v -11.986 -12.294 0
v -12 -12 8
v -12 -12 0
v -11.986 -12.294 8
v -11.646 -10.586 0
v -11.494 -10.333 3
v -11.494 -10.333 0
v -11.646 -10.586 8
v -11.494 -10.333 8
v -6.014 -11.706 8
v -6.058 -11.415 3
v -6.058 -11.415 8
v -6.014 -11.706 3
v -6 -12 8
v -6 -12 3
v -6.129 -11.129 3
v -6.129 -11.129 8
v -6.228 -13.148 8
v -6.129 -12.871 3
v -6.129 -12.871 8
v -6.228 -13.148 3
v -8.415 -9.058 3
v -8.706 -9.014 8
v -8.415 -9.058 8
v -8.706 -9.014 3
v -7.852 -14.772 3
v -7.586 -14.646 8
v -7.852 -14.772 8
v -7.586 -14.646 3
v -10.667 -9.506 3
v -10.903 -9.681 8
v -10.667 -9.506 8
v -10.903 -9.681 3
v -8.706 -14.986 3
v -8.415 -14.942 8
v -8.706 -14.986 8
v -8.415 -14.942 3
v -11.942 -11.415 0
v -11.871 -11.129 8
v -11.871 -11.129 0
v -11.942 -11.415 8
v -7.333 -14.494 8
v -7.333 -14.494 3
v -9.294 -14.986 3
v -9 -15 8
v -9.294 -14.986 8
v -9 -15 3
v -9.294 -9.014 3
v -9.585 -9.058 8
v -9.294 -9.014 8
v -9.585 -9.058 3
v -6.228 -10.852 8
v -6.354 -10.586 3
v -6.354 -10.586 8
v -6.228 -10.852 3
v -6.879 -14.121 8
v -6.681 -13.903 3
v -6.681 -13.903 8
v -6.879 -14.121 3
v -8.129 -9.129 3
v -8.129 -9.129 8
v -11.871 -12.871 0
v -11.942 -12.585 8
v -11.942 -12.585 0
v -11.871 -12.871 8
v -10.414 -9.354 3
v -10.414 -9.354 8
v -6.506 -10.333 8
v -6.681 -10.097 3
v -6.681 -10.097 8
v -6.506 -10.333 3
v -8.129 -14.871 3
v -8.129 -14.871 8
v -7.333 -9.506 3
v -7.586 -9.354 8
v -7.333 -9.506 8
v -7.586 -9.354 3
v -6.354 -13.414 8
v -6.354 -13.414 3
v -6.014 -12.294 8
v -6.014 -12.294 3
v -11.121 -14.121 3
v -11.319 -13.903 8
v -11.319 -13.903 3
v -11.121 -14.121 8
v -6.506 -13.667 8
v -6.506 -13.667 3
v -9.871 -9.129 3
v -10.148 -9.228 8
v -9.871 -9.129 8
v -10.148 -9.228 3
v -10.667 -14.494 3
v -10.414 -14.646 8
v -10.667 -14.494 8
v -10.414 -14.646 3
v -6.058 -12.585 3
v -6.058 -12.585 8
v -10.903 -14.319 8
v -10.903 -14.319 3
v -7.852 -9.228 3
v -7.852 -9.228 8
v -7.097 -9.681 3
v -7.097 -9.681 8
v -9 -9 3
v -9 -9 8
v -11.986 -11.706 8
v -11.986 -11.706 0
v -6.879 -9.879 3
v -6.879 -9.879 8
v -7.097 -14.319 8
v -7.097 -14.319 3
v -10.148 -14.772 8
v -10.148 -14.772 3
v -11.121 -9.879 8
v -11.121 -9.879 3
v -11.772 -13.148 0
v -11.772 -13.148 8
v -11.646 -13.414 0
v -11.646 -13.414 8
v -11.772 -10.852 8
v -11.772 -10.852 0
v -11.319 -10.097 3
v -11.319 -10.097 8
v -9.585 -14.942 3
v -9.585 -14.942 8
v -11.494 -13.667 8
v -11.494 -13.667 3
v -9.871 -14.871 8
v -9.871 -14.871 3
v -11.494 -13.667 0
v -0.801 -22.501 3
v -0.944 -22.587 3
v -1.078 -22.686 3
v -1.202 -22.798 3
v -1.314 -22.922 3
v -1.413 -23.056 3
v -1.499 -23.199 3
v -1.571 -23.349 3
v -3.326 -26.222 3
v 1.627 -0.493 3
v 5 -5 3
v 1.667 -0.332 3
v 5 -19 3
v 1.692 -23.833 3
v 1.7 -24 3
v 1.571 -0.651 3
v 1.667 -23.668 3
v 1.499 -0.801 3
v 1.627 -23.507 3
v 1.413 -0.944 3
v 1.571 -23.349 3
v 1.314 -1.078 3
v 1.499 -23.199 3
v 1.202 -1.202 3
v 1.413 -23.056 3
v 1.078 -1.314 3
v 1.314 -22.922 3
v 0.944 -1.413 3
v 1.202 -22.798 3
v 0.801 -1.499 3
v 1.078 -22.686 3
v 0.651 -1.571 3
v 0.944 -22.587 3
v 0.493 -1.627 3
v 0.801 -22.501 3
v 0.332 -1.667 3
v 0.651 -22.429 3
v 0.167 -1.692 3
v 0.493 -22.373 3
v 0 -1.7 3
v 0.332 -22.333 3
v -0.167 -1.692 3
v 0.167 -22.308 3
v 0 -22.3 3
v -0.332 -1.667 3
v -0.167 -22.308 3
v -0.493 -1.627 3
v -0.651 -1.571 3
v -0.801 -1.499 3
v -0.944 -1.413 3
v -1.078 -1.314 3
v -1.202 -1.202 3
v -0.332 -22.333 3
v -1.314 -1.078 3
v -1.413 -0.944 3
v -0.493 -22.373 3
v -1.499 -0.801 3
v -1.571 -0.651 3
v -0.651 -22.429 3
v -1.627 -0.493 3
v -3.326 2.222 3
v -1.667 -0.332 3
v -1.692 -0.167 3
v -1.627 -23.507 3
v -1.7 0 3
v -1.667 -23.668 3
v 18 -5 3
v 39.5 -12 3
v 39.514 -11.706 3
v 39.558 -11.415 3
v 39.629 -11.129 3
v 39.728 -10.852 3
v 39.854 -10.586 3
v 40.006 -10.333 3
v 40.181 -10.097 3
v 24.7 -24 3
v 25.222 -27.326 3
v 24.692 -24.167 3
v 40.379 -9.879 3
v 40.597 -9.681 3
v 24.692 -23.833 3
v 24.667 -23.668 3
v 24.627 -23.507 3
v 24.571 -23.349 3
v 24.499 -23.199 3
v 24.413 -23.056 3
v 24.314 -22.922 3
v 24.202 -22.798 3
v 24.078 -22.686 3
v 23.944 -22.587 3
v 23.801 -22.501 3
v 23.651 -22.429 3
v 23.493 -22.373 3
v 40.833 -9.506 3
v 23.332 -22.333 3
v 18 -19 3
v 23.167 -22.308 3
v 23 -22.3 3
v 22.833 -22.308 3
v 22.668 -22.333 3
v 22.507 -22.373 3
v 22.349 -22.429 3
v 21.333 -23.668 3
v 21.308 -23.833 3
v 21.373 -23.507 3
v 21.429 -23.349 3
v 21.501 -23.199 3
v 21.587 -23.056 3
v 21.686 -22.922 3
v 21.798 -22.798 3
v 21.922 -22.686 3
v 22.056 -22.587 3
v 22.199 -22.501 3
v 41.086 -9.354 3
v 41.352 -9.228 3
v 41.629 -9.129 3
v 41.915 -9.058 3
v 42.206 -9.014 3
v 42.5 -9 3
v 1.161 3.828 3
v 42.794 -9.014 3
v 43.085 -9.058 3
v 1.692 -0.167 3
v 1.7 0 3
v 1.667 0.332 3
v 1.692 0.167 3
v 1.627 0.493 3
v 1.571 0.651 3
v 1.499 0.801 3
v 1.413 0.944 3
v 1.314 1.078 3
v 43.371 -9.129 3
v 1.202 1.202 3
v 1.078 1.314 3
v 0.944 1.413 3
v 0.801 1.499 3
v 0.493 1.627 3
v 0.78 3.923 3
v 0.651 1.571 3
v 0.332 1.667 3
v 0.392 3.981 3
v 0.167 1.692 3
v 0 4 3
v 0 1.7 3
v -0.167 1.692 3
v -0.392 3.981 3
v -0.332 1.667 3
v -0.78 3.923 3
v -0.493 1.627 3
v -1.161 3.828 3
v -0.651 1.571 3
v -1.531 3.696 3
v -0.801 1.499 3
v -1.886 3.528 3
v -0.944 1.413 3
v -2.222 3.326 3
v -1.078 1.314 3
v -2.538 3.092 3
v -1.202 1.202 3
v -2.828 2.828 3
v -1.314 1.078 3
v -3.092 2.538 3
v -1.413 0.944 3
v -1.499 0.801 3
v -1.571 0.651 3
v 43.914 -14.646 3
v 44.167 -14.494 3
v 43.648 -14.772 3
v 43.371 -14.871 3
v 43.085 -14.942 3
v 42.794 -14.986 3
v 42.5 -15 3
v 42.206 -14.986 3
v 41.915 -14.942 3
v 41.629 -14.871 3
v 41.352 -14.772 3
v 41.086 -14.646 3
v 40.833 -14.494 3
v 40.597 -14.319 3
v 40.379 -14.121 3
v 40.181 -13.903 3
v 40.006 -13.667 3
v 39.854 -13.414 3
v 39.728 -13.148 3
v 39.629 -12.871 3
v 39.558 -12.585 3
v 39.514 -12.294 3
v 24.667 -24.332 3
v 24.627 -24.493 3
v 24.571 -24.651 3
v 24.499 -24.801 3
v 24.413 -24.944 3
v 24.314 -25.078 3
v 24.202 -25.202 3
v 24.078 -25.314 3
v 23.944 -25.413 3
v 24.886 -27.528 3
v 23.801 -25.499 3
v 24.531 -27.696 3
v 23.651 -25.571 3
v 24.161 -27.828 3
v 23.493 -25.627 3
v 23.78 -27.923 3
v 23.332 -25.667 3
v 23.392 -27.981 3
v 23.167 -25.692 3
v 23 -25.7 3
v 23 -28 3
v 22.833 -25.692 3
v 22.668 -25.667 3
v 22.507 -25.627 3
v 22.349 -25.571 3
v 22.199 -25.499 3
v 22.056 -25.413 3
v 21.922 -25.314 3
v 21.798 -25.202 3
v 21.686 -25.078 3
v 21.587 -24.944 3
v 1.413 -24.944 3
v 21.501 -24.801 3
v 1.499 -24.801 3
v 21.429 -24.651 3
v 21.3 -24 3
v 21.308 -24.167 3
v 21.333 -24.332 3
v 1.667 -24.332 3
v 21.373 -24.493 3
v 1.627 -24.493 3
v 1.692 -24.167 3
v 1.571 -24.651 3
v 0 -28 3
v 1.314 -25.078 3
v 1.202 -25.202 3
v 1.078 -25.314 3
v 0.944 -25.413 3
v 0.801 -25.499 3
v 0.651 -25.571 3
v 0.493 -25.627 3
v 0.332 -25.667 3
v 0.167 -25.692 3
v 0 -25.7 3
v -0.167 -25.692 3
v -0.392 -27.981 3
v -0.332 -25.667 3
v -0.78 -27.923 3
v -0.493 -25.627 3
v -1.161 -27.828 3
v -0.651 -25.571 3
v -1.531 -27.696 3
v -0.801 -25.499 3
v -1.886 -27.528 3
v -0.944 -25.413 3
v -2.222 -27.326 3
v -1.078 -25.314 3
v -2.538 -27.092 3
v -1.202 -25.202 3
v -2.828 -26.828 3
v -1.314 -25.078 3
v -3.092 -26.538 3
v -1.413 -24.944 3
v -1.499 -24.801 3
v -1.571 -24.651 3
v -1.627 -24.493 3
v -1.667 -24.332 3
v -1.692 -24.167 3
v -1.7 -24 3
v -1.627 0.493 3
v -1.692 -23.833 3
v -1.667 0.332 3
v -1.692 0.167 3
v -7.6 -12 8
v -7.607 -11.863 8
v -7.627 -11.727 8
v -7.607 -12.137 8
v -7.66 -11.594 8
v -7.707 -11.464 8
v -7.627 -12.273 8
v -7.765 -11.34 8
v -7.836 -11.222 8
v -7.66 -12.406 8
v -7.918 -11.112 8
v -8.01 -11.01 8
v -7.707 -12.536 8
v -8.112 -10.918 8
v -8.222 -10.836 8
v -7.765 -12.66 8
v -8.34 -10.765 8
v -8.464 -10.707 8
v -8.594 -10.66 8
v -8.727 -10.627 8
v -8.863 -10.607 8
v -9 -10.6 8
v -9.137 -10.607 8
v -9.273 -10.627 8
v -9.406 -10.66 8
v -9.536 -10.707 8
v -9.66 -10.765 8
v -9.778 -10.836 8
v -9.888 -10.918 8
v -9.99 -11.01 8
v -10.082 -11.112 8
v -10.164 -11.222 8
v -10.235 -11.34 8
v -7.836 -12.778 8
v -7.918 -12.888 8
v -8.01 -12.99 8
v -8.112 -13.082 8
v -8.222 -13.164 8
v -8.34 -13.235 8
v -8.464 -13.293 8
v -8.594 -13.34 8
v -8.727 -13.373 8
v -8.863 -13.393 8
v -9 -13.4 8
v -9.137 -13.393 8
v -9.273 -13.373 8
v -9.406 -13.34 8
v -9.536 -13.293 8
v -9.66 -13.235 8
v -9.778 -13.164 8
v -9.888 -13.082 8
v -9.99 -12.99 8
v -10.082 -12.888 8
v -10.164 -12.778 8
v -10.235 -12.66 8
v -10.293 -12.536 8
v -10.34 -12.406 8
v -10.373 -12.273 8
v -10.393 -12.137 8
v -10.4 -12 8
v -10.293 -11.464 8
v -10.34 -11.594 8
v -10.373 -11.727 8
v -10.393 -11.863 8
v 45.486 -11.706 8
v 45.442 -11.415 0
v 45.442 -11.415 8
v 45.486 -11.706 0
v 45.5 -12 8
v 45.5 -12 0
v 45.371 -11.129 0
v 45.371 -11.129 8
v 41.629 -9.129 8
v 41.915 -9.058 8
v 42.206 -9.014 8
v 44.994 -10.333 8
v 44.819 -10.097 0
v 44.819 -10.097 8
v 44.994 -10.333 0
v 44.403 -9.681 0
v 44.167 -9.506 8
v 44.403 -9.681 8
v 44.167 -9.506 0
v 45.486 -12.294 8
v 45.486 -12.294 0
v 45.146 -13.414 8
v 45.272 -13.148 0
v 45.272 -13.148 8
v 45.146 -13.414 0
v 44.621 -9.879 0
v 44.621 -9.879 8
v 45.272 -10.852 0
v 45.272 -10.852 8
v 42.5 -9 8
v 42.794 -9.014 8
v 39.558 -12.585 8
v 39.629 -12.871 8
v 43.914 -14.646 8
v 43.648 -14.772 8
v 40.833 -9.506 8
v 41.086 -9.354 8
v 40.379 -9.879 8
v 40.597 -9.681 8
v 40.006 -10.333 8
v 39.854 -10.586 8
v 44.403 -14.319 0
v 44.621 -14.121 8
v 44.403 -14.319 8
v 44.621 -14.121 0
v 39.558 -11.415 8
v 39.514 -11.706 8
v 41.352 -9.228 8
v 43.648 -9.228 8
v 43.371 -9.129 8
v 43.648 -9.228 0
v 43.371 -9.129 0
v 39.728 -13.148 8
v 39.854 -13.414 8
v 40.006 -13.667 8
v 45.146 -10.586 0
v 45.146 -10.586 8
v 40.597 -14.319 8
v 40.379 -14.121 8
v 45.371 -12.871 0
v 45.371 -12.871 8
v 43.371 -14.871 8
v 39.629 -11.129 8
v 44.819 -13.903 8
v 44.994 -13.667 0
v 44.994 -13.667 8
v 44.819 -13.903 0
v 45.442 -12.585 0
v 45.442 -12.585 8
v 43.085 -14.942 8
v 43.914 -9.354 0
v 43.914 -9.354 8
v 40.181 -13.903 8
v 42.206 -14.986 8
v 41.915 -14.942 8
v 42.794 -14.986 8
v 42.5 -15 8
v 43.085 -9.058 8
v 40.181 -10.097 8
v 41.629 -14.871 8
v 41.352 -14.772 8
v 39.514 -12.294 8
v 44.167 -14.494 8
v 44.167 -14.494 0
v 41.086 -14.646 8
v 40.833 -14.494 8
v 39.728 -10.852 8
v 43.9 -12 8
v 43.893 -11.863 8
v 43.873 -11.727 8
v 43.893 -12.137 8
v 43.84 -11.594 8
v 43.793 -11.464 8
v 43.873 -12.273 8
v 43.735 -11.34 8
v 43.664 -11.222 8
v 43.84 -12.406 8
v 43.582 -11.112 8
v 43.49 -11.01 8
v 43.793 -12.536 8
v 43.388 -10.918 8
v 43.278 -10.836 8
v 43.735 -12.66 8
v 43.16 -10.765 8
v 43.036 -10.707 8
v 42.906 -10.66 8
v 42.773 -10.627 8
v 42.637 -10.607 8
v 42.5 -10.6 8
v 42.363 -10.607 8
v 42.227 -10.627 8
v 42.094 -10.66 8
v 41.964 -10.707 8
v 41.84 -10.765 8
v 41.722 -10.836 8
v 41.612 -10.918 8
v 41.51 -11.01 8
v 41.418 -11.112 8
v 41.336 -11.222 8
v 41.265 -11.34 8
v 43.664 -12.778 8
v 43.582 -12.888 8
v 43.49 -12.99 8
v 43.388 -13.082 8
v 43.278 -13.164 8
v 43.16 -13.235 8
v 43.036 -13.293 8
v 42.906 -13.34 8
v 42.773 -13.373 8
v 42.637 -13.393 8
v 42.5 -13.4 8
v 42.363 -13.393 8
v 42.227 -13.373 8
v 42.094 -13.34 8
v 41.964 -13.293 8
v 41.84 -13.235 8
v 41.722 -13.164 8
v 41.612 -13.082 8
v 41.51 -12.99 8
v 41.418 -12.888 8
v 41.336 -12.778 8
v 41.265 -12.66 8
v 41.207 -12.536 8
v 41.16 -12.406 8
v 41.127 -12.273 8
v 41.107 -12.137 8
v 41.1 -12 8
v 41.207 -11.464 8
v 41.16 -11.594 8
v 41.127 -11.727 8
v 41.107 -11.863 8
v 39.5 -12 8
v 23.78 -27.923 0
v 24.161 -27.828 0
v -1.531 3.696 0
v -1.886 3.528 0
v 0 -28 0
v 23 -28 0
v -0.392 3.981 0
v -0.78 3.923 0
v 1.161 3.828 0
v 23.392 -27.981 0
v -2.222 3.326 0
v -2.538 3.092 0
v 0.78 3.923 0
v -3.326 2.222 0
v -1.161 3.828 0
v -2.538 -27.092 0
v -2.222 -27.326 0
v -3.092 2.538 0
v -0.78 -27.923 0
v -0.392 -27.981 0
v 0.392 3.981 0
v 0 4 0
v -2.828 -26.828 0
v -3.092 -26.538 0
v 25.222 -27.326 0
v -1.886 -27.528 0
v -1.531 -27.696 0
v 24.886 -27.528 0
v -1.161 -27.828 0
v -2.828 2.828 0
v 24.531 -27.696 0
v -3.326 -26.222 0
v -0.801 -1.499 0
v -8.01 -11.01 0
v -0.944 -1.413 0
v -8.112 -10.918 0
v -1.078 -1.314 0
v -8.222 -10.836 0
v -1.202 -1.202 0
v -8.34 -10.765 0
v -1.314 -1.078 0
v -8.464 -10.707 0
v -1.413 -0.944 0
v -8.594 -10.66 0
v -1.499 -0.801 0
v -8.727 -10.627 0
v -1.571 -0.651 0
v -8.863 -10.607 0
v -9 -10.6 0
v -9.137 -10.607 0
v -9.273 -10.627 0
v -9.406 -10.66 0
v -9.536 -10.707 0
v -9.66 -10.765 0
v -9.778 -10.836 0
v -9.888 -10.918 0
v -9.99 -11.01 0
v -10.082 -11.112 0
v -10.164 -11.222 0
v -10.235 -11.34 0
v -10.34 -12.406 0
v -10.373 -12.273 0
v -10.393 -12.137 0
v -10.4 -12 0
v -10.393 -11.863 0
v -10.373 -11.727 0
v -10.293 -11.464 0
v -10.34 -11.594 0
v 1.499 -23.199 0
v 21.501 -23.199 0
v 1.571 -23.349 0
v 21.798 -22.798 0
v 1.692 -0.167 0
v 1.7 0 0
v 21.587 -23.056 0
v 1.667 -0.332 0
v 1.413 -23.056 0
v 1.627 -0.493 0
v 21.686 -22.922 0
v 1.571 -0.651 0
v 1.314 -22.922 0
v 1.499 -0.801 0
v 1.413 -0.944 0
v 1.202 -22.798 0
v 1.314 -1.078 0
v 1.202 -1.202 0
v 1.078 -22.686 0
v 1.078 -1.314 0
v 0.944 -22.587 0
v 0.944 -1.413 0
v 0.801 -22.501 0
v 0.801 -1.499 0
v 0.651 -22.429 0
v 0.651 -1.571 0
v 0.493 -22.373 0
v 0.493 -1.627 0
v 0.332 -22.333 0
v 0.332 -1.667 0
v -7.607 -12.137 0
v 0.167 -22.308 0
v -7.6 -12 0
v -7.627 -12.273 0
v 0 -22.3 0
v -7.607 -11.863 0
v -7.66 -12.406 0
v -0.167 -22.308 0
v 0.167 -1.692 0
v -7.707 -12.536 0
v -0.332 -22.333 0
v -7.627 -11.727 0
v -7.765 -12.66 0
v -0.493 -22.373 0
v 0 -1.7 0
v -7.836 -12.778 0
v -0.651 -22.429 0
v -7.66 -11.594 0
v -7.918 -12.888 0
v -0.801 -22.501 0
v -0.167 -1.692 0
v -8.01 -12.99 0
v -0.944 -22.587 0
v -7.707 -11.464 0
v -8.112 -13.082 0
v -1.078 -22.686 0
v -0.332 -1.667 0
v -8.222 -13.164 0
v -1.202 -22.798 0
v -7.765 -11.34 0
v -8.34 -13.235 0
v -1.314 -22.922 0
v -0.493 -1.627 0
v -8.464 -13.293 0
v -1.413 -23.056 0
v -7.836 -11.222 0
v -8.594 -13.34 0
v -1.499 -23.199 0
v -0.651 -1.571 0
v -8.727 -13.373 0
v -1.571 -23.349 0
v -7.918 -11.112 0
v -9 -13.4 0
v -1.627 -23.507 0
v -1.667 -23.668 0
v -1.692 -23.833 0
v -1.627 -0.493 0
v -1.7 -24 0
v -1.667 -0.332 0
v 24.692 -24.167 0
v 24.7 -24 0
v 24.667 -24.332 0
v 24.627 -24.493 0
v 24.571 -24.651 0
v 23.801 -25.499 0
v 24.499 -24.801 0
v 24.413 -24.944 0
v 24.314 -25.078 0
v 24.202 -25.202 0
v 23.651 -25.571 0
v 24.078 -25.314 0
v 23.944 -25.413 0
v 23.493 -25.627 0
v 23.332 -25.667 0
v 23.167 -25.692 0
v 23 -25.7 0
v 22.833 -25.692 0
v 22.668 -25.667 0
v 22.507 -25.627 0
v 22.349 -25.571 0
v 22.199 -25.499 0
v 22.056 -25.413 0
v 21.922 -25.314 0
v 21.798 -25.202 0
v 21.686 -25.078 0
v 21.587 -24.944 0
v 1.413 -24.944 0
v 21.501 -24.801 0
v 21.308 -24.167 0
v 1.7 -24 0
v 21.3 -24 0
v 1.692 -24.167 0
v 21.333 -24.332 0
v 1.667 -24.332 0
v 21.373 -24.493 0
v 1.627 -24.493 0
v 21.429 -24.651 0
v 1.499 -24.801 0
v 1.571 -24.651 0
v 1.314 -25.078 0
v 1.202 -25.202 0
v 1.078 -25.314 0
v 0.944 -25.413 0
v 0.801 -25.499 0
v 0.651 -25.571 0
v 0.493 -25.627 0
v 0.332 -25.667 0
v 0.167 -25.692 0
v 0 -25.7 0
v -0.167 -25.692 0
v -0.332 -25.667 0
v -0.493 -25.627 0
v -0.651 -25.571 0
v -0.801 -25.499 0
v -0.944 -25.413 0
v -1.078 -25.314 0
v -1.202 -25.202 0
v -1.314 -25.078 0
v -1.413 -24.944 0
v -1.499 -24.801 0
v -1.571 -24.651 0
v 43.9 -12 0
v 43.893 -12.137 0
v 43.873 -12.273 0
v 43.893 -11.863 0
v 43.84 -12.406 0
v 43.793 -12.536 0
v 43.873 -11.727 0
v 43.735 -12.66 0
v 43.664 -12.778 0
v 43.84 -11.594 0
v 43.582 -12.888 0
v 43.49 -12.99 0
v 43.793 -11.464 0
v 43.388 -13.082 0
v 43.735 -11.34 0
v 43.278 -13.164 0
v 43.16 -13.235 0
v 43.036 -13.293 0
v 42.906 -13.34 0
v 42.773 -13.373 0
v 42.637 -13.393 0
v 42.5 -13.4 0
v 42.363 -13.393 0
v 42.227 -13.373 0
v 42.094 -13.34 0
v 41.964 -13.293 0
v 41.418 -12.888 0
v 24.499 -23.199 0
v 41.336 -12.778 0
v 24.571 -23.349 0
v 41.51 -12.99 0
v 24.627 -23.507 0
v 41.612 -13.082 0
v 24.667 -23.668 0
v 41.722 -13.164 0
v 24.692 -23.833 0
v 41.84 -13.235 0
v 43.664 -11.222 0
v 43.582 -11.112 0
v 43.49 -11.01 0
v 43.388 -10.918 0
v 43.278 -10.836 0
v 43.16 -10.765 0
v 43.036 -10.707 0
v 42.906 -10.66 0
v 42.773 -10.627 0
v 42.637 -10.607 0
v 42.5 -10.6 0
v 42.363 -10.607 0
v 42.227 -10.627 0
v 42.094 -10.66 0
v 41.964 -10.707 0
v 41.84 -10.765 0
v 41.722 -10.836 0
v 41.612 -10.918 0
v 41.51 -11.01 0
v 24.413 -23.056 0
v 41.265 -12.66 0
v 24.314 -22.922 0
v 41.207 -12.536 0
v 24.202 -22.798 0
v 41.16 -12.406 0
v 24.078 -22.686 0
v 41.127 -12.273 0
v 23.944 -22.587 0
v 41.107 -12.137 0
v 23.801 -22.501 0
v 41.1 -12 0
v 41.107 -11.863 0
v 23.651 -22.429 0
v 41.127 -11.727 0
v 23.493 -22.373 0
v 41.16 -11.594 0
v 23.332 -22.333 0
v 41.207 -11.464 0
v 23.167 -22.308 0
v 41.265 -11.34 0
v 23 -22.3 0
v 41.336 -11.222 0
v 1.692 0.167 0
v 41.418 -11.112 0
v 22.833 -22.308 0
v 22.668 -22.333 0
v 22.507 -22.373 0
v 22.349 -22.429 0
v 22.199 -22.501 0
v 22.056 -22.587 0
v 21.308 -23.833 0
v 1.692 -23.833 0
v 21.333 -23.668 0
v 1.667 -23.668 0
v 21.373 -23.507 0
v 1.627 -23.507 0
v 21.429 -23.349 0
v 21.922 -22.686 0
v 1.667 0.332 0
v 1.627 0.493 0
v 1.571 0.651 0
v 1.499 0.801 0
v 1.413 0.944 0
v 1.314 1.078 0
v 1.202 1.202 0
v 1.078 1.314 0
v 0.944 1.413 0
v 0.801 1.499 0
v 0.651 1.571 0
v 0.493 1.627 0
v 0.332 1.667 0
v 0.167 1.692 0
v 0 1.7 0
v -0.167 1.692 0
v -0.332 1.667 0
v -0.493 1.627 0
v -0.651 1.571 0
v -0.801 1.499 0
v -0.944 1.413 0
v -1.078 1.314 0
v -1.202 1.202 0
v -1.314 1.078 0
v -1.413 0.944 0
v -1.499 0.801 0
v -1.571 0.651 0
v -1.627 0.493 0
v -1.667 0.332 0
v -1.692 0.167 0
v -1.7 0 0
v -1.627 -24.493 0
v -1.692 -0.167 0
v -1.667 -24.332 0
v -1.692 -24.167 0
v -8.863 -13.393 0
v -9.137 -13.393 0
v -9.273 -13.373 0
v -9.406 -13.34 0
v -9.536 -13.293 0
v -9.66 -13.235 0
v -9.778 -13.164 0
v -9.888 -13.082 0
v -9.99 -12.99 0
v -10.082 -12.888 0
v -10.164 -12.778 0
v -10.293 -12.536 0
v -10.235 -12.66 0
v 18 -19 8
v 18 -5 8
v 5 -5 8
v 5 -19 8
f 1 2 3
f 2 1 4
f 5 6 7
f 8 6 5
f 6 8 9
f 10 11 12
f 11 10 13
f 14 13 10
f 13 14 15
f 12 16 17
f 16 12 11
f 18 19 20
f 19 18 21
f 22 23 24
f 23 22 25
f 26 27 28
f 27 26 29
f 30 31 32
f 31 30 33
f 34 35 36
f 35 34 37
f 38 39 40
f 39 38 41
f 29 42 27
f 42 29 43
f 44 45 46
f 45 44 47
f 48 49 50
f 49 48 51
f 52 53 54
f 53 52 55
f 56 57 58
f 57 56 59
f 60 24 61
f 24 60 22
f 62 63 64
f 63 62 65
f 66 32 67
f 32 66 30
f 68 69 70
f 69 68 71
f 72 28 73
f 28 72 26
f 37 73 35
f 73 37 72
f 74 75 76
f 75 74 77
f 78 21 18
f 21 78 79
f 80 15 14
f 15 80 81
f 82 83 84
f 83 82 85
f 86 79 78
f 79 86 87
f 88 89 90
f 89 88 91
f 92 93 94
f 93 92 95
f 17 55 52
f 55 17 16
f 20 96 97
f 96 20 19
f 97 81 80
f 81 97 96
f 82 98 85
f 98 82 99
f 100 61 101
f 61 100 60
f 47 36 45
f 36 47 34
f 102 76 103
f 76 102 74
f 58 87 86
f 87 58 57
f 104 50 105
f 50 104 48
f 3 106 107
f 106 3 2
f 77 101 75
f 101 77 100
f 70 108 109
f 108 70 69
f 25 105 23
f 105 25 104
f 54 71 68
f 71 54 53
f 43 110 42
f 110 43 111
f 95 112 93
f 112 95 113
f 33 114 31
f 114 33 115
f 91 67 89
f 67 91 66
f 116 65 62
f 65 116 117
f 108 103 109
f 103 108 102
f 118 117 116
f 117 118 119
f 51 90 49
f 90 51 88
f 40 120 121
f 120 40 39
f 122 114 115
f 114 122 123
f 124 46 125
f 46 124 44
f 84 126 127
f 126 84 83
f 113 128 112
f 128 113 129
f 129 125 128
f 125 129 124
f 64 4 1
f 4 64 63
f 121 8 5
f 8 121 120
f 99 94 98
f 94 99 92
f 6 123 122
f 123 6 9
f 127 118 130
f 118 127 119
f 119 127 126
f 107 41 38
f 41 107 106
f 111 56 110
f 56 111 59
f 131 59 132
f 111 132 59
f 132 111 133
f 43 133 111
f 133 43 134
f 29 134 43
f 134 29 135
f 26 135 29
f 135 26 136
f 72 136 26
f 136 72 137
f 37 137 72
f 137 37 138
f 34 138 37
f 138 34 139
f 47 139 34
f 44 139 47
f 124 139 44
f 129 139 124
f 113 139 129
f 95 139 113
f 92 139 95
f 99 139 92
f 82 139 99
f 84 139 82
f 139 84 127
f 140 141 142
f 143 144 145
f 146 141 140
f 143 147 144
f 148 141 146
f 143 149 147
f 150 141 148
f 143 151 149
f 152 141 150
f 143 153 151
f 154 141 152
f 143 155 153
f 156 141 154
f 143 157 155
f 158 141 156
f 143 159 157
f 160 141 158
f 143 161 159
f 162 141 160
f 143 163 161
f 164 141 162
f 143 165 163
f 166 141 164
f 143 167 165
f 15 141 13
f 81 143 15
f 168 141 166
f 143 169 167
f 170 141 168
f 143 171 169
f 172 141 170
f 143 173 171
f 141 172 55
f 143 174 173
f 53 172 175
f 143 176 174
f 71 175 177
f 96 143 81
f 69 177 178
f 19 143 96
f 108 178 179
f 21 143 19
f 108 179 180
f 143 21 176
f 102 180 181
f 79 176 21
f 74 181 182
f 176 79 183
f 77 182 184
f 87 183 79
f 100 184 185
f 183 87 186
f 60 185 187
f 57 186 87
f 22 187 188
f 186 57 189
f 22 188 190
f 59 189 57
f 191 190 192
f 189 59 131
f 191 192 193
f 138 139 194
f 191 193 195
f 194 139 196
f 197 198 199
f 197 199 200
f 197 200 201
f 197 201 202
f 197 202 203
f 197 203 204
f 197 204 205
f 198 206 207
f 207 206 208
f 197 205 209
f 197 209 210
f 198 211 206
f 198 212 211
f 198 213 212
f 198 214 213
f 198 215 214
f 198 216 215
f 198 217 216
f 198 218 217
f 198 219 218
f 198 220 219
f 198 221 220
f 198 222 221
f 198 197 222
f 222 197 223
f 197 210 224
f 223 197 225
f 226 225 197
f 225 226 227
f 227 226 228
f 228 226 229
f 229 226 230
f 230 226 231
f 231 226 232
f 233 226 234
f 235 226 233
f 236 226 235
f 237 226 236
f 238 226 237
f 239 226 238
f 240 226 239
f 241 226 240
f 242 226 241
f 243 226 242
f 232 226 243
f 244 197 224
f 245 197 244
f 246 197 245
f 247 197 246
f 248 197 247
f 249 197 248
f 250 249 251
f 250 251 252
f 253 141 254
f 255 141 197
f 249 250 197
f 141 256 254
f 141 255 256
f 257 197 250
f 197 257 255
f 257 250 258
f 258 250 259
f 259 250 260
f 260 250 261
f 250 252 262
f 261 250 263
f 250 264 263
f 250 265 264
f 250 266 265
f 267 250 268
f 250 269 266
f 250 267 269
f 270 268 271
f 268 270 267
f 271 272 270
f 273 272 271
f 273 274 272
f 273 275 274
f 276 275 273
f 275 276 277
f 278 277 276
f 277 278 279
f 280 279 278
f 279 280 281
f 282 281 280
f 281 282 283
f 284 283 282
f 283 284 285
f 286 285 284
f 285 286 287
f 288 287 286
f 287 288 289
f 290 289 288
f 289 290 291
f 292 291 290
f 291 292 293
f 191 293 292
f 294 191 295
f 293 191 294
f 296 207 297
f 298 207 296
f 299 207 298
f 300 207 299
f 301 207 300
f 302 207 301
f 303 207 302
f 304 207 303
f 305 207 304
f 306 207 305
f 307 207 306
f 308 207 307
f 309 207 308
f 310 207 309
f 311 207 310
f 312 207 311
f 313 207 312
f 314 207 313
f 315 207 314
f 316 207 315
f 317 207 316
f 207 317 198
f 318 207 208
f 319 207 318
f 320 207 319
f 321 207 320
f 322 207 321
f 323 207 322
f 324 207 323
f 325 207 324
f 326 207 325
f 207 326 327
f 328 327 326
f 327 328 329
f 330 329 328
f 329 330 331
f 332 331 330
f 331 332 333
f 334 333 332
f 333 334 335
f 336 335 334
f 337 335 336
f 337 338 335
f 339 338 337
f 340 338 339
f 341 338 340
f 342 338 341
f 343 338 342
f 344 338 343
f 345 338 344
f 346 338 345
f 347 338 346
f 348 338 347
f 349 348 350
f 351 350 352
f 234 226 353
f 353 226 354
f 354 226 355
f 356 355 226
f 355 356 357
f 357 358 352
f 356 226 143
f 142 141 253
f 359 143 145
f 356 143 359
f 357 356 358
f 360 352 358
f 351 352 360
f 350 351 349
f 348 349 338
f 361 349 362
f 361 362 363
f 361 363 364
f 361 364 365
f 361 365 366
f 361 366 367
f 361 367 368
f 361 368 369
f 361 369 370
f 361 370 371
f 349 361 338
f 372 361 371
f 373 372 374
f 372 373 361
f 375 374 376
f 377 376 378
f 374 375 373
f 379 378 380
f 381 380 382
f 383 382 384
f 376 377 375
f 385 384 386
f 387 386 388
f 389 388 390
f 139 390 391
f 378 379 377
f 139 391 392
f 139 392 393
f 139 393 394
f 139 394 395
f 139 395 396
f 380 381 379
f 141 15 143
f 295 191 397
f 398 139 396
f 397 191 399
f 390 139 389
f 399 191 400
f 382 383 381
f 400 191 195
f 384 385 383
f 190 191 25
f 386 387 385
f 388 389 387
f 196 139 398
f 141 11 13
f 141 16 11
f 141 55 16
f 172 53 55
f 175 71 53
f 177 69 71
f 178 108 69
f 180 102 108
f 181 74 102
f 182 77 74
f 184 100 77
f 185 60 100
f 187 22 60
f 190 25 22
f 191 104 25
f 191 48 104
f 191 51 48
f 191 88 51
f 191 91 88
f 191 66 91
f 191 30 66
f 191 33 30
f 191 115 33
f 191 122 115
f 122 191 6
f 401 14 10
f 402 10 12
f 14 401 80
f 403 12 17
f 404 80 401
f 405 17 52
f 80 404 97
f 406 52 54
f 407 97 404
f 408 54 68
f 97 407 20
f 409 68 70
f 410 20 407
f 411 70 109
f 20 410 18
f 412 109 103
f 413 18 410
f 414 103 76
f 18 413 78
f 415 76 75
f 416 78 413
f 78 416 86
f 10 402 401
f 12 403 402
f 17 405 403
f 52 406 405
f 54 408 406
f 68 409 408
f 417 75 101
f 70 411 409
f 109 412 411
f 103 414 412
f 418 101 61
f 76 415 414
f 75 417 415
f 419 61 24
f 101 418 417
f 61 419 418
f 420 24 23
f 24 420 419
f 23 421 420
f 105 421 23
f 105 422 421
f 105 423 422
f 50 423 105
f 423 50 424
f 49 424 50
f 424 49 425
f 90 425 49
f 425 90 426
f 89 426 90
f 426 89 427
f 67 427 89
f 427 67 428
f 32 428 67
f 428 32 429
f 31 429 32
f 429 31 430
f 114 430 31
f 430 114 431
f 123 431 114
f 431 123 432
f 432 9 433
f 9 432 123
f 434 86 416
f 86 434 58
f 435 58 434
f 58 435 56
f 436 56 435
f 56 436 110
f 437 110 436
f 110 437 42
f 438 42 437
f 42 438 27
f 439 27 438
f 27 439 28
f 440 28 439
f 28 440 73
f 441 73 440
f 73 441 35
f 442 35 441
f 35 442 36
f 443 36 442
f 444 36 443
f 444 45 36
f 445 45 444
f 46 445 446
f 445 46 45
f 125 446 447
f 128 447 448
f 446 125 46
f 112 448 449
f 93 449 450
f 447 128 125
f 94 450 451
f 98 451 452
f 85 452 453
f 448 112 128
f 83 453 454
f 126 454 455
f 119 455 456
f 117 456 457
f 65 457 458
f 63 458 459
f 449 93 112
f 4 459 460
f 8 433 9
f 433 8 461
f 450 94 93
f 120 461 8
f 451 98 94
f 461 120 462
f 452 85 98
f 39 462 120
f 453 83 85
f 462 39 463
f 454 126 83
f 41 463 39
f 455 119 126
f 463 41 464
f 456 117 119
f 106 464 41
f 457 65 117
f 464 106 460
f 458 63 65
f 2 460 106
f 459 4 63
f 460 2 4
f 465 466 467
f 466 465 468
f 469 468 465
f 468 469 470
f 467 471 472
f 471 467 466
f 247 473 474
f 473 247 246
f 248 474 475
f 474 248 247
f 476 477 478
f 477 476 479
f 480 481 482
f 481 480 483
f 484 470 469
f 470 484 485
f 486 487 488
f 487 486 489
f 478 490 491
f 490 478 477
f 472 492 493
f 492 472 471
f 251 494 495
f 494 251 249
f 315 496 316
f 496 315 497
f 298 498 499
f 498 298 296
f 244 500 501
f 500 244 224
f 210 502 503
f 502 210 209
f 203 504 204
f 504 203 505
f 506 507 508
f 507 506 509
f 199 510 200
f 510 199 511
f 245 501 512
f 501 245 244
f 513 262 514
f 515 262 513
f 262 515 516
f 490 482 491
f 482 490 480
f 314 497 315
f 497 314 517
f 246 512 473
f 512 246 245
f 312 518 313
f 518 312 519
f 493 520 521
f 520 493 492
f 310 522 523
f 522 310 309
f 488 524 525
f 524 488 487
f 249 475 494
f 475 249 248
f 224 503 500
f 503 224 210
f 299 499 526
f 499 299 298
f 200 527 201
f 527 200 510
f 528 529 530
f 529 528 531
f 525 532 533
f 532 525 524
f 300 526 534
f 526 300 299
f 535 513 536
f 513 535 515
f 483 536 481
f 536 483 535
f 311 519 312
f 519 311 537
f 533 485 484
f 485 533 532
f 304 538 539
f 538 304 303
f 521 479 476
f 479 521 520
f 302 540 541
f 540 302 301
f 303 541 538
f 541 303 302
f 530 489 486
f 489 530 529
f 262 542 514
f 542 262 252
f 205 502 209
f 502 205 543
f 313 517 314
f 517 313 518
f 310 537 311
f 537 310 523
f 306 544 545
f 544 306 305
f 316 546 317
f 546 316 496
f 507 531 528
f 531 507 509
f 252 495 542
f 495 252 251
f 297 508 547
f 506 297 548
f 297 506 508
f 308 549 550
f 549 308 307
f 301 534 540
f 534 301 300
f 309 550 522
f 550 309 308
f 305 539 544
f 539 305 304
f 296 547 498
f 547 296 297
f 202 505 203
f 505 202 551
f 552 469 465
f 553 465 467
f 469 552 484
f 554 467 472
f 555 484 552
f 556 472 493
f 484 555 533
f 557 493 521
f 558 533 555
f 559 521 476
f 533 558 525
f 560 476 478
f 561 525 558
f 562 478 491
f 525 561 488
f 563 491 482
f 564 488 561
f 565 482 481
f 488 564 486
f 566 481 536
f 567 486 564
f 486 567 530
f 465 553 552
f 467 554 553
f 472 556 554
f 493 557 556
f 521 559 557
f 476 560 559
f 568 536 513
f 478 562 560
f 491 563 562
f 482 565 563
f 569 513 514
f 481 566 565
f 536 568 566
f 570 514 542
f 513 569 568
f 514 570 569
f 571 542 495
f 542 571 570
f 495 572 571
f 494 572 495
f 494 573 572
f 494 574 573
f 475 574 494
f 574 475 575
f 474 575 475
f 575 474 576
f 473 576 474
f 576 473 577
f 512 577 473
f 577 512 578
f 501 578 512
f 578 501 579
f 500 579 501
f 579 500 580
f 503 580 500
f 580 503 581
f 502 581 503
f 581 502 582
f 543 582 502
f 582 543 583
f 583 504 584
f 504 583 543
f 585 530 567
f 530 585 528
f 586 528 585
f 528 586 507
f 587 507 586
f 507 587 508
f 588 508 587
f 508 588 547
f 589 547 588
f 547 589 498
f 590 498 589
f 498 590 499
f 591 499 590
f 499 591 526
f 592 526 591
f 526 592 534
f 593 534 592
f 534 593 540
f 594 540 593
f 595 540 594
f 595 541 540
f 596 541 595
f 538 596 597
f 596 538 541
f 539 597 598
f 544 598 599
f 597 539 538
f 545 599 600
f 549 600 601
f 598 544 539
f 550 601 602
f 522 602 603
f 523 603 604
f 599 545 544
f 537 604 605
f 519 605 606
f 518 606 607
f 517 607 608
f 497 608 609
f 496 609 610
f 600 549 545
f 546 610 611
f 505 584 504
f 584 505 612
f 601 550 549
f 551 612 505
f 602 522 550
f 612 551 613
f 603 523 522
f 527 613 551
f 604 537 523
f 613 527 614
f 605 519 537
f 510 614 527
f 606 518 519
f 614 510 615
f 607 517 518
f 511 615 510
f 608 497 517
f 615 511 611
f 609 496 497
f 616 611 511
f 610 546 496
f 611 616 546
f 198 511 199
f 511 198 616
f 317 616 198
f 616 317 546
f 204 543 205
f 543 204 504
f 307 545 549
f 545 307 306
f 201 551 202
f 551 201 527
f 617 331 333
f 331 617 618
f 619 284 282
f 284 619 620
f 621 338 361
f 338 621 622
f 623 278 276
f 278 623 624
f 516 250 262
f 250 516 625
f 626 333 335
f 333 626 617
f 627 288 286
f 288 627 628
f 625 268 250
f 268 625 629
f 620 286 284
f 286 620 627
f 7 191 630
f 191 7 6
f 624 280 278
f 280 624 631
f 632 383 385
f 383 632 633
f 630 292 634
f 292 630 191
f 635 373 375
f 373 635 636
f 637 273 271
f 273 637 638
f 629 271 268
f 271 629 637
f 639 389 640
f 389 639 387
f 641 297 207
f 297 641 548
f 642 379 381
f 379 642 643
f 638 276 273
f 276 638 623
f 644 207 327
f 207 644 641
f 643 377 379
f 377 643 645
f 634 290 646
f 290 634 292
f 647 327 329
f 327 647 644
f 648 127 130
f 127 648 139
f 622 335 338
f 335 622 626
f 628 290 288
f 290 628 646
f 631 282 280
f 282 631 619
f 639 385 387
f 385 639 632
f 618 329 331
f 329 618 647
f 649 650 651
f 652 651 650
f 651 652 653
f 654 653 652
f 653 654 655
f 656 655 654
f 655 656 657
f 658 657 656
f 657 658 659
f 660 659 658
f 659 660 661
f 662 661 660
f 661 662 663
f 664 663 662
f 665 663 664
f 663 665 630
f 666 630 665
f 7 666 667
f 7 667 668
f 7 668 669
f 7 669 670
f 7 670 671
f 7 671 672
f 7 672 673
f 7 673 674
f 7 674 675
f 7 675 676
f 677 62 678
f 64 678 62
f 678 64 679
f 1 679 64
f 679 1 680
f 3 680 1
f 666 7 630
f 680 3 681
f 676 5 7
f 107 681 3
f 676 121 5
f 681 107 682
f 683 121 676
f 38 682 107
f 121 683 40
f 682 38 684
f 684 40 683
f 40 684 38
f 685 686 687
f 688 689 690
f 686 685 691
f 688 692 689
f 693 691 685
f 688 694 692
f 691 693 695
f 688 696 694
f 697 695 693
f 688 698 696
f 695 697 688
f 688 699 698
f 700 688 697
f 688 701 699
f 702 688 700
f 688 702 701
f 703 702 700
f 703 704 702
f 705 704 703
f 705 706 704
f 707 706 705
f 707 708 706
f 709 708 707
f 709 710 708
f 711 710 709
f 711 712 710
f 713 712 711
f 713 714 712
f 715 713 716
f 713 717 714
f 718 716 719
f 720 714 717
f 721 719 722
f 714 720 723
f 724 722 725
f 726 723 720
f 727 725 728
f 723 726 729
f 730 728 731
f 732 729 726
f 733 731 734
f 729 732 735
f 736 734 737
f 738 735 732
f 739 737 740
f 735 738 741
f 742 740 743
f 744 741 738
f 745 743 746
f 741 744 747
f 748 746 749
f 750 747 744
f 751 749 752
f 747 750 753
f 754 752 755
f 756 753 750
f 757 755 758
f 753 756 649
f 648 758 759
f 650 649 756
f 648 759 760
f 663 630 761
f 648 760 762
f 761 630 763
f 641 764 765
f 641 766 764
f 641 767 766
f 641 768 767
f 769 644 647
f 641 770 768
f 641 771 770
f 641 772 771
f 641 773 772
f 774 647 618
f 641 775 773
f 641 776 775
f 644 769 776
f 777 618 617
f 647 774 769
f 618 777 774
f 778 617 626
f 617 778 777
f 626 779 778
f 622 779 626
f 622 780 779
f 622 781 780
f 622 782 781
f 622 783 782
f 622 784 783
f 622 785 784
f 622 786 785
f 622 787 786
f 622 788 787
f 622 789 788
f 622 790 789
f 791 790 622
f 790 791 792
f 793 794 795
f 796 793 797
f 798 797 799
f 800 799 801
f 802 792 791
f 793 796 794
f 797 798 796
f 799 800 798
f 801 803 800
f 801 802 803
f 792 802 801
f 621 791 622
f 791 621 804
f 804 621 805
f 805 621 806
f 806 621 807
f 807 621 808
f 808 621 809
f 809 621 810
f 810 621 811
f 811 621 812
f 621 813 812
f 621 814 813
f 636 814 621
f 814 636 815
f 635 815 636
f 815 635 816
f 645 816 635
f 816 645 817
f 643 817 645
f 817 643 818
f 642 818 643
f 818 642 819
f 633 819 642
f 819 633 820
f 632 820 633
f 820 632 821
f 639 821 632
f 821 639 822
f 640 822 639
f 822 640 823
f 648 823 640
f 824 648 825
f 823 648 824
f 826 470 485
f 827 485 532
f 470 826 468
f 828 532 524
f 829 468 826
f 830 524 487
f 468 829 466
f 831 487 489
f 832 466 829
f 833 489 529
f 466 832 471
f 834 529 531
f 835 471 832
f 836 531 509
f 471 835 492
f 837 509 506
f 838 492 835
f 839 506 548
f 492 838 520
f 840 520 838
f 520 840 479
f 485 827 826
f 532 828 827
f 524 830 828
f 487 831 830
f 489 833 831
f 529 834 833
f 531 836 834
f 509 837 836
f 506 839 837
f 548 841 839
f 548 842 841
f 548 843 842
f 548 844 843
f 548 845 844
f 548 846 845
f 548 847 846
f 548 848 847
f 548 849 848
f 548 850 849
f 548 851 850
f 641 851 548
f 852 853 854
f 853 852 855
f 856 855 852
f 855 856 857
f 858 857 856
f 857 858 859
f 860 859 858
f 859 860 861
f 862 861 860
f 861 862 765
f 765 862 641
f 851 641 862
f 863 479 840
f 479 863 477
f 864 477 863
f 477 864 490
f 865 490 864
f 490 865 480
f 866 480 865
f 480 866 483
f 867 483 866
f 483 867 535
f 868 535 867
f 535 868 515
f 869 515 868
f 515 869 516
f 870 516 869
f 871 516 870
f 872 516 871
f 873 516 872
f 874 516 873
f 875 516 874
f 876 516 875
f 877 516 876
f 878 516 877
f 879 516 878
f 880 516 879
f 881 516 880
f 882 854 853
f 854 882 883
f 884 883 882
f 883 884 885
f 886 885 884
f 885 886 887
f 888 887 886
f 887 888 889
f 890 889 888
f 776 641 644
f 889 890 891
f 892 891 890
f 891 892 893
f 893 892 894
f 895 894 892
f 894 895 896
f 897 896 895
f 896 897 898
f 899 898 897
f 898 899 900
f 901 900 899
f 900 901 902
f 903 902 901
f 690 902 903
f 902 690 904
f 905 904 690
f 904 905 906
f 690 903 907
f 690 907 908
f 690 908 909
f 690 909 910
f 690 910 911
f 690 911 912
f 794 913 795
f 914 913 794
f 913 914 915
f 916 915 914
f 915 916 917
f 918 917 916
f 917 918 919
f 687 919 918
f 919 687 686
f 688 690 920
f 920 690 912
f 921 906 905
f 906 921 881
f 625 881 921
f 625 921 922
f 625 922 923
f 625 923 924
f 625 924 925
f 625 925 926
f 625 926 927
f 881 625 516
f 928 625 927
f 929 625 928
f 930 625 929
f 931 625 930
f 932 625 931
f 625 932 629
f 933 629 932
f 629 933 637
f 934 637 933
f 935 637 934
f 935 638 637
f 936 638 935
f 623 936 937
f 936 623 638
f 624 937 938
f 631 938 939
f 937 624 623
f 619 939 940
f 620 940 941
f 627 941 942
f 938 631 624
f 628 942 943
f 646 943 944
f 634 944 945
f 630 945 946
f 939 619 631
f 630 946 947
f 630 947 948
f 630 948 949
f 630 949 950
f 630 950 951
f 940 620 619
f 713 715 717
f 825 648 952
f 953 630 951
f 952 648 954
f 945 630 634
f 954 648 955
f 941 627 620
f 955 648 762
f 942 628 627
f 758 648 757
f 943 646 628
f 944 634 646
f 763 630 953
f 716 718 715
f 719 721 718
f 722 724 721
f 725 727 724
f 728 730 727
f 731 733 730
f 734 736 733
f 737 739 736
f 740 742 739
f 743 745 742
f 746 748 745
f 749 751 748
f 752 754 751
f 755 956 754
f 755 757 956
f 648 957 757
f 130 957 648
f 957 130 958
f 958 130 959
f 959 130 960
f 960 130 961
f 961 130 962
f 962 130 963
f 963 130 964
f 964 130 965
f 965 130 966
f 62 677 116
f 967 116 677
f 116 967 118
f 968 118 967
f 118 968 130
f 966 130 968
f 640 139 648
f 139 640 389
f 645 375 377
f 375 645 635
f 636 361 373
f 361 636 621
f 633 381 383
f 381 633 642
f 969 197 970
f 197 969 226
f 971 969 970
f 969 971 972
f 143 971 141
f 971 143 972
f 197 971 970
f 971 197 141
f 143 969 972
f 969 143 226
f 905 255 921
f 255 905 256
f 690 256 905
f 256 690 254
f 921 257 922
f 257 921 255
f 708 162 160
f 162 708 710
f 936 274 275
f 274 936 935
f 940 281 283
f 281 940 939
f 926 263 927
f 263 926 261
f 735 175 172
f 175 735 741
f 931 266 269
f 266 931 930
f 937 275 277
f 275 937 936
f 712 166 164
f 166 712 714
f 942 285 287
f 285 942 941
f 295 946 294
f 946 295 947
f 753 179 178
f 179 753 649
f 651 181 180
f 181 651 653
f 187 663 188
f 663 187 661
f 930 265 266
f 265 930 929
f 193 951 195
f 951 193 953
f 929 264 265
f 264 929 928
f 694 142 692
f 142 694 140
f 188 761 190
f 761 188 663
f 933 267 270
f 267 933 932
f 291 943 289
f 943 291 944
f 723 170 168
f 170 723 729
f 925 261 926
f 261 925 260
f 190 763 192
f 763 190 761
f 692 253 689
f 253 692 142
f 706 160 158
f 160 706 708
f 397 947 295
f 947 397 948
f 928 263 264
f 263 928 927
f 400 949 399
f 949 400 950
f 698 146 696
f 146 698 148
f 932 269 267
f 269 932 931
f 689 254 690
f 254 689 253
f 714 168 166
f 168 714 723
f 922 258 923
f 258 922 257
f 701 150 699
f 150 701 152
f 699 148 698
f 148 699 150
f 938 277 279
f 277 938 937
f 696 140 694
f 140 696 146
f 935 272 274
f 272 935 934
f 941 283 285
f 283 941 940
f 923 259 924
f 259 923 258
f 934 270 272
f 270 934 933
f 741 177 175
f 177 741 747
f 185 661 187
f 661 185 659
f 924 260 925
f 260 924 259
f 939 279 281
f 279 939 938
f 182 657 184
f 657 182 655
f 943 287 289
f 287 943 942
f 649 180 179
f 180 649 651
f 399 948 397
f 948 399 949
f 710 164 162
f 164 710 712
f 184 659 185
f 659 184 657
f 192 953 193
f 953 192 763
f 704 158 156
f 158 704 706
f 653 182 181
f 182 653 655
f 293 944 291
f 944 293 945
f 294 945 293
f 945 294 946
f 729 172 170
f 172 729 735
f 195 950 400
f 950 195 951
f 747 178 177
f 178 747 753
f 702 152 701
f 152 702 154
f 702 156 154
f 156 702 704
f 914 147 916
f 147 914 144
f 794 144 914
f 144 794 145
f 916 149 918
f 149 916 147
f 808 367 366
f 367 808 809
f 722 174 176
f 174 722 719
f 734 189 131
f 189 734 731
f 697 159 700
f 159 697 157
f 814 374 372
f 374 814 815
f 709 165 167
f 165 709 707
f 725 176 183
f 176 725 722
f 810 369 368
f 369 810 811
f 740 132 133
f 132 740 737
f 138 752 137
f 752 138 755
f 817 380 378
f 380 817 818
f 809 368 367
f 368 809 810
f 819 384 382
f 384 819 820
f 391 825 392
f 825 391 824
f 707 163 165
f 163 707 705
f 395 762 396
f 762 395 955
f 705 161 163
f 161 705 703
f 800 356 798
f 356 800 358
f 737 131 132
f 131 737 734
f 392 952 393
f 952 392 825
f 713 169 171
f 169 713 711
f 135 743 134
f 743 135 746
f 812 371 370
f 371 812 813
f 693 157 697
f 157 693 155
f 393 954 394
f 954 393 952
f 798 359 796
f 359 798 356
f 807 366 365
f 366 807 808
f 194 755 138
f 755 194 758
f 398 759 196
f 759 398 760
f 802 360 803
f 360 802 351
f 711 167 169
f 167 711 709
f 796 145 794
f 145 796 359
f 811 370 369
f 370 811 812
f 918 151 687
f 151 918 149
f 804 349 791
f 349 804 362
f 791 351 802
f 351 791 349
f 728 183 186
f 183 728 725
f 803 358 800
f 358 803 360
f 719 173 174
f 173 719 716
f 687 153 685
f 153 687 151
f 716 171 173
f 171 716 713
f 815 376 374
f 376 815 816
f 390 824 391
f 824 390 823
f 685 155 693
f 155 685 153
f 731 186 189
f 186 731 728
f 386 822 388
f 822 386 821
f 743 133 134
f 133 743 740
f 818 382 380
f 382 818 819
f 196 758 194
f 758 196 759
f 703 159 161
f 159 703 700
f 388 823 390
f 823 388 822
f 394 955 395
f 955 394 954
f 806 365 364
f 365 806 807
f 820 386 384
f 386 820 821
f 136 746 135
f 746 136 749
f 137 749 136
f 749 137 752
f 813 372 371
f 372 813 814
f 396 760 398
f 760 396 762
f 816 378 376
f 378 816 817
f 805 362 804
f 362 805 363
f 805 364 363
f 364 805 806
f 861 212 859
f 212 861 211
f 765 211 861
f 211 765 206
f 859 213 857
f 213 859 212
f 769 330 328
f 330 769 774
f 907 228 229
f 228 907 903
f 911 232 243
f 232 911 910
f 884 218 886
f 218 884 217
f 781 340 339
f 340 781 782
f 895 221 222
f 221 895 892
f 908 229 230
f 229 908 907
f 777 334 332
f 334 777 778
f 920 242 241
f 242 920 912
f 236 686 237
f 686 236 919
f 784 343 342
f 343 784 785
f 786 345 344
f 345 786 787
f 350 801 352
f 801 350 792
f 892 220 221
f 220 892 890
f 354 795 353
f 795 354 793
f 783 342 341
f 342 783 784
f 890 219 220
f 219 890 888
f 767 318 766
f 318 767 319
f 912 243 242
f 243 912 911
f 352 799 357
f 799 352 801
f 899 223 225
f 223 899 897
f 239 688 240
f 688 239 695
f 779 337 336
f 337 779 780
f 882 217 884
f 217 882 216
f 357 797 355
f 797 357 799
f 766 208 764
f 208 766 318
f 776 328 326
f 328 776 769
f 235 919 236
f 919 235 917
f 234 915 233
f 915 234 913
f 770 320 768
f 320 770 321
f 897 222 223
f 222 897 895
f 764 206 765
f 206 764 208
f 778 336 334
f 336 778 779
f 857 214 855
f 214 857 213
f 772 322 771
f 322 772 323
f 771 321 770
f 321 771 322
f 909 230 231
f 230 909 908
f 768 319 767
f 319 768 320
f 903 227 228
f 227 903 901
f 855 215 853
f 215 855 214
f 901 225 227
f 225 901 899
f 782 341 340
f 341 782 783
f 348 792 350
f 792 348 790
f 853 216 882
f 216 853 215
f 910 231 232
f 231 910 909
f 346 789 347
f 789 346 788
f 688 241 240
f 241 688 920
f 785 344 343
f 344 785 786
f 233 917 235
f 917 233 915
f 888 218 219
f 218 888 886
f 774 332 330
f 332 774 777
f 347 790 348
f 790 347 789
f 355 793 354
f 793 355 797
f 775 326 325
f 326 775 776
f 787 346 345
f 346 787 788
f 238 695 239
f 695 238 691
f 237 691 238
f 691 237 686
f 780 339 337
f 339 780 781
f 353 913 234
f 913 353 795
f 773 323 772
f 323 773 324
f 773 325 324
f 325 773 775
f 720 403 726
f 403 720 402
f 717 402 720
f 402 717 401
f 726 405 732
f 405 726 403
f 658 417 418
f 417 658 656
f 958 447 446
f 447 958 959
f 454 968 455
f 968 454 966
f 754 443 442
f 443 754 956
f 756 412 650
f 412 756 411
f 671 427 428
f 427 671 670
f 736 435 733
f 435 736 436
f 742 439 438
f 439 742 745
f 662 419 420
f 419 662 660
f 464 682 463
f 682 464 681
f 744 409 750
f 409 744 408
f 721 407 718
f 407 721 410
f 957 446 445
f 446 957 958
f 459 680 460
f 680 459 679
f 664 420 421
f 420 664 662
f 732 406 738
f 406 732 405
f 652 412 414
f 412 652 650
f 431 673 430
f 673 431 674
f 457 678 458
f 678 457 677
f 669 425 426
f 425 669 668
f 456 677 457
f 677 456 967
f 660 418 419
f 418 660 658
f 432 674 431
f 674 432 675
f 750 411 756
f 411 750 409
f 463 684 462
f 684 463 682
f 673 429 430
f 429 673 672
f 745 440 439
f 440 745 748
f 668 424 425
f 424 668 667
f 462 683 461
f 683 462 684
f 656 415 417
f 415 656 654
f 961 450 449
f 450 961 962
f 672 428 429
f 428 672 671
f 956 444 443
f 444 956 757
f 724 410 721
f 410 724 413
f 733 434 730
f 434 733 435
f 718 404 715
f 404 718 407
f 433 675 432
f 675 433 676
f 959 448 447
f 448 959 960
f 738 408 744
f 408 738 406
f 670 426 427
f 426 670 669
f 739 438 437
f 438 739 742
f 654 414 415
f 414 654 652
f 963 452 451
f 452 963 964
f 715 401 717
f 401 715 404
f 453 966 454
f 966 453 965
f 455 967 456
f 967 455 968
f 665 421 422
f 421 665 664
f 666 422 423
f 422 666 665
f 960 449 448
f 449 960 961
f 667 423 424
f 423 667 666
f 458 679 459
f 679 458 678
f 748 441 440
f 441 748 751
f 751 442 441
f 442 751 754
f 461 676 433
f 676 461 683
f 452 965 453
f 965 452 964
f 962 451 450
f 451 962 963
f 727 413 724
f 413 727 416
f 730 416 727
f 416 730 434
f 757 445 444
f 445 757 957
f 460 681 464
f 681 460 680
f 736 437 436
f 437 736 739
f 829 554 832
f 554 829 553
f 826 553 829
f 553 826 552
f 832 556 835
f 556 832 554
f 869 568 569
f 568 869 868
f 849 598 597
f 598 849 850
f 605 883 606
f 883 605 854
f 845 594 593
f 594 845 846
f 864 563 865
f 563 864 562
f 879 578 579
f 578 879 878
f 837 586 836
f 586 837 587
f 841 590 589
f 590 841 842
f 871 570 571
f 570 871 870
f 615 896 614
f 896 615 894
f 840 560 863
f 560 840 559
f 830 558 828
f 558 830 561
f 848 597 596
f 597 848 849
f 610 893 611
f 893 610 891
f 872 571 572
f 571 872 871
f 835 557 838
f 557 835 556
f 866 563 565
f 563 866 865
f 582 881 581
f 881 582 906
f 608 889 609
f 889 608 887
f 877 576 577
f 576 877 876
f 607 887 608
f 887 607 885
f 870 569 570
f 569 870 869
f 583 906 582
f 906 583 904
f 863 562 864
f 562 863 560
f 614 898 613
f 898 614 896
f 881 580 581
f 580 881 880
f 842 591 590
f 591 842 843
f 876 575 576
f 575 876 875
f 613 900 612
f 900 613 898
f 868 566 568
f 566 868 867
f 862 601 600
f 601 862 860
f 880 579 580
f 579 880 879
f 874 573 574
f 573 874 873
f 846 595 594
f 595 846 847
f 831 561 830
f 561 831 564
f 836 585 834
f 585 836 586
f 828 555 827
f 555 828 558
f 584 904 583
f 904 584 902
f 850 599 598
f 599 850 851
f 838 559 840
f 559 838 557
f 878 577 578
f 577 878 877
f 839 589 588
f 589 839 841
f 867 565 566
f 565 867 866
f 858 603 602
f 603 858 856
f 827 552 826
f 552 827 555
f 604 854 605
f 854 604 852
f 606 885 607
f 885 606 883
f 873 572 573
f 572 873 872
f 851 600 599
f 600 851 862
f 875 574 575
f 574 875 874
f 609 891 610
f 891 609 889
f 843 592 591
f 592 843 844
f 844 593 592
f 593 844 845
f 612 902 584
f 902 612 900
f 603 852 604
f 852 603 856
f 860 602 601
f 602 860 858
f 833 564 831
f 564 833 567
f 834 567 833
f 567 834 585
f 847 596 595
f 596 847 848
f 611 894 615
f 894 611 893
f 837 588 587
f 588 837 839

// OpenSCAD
// Converter → rover chassis mount plate.
// 3-point chassis support (A, B, C). Board has 2 mount holes.
// Self-tapping M3 on both sides.
// Board sits on raised bosses; the plate body never contacts the PCB.

$fn = 64;

// ---- Plate ----
plate_thickness = 3;
plate_pad_r     = 3;      // rim around board bosses (= boss_od/2)
chassis_pad_r   = 4;      // rim around chassis holes

// ---- M3 self-tapping ----
m3_clearance    = 3.4;    // chassis-side: through-hole for M3 shank
m3_self_pilot   = 2.8;    // board-side: pilot bore for self-tap into plastic

// ---- Board-side bosses ----
boss_h          = 5;      // standoff height under PCB (airflow gap)
boss_od         = 6;

// ---- Chassis screw positions (3-point) ----
// A as origin; B 24mm below A; C 23mm right of B.
A = [ 0,   0];
B = A + [ 0, -24];
C = B + [23,   0];
chassis_screws = [A, B, C];

// ---- Board screws (2 holes) ----
// h1: y = midpoint of A and B; x = A.x - 9.
// h2: 51.5mm right of h1 (originally 53.5; field tweak: shifted 2mm left).
board_h1 = [A[0] - 9, (A[1] + B[1]) / 2];
board_h2 = board_h1 + [51.5, 0];
board_screws_p = [board_h1, board_h2];

// ---- Boss-height island inside the chassis-3-point bounding box ----
// The 3 chassis screws span a rectangular bbox; place a raised pad
// inside that bbox with margin so it clears each chassis pilot.
island_margin = 5;

function vmin(vs, i) = min([for (p = vs) p[i]]);
function vmax(vs, i) = max([for (p = vs) p[i]]);

island_x0 = vmin(chassis_screws, 0) + island_margin;
island_y0 = vmin(chassis_screws, 1) + island_margin;
island_w  = vmax(chassis_screws, 0) - vmin(chassis_screws, 0) - 2 * island_margin;
island_d  = vmax(chassis_screws, 1) - vmin(chassis_screws, 1) - 2 * island_margin;

module chassis_hole() {
    translate([0, 0, -0.1])
        cylinder(d = m3_clearance, h = plate_thickness + 0.2);
}

module boss() {
    translate([0, 0, plate_thickness])
        cylinder(d = boss_od, h = boss_h);
}

module boss_pilot() {
    translate([0, 0, -0.1])
        cylinder(d = m3_self_pilot, h = plate_thickness + boss_h + 0.2);
}

module plate_body() {
    // Convex hull of all 5 screw positions: rounded pentagon with
    // straight tangent edges between adjacent cylinders.
    hull() {
        for (p = board_screws_p)
            translate([p[0], p[1], 0])
                cylinder(r = plate_pad_r, h = plate_thickness);
        for (p = chassis_screws)
            translate([p[0], p[1], 0])
                cylinder(r = chassis_pad_r, h = plate_thickness);
    }
}

module island() {
    translate([island_x0, island_y0, plate_thickness])
        cube([island_w, island_d, boss_h]);
}

module converter_plate() {
    difference() {
        union() {
            plate_body();
            for (p = board_screws_p)
                translate([p[0], p[1], 0]) boss();
            island();
        }
        for (p = chassis_screws)
            translate([p[0], p[1], 0]) chassis_hole();
        for (p = board_screws_p)
            translate([p[0], p[1], 0]) boss_pilot();
    }
}

converter_plate();
